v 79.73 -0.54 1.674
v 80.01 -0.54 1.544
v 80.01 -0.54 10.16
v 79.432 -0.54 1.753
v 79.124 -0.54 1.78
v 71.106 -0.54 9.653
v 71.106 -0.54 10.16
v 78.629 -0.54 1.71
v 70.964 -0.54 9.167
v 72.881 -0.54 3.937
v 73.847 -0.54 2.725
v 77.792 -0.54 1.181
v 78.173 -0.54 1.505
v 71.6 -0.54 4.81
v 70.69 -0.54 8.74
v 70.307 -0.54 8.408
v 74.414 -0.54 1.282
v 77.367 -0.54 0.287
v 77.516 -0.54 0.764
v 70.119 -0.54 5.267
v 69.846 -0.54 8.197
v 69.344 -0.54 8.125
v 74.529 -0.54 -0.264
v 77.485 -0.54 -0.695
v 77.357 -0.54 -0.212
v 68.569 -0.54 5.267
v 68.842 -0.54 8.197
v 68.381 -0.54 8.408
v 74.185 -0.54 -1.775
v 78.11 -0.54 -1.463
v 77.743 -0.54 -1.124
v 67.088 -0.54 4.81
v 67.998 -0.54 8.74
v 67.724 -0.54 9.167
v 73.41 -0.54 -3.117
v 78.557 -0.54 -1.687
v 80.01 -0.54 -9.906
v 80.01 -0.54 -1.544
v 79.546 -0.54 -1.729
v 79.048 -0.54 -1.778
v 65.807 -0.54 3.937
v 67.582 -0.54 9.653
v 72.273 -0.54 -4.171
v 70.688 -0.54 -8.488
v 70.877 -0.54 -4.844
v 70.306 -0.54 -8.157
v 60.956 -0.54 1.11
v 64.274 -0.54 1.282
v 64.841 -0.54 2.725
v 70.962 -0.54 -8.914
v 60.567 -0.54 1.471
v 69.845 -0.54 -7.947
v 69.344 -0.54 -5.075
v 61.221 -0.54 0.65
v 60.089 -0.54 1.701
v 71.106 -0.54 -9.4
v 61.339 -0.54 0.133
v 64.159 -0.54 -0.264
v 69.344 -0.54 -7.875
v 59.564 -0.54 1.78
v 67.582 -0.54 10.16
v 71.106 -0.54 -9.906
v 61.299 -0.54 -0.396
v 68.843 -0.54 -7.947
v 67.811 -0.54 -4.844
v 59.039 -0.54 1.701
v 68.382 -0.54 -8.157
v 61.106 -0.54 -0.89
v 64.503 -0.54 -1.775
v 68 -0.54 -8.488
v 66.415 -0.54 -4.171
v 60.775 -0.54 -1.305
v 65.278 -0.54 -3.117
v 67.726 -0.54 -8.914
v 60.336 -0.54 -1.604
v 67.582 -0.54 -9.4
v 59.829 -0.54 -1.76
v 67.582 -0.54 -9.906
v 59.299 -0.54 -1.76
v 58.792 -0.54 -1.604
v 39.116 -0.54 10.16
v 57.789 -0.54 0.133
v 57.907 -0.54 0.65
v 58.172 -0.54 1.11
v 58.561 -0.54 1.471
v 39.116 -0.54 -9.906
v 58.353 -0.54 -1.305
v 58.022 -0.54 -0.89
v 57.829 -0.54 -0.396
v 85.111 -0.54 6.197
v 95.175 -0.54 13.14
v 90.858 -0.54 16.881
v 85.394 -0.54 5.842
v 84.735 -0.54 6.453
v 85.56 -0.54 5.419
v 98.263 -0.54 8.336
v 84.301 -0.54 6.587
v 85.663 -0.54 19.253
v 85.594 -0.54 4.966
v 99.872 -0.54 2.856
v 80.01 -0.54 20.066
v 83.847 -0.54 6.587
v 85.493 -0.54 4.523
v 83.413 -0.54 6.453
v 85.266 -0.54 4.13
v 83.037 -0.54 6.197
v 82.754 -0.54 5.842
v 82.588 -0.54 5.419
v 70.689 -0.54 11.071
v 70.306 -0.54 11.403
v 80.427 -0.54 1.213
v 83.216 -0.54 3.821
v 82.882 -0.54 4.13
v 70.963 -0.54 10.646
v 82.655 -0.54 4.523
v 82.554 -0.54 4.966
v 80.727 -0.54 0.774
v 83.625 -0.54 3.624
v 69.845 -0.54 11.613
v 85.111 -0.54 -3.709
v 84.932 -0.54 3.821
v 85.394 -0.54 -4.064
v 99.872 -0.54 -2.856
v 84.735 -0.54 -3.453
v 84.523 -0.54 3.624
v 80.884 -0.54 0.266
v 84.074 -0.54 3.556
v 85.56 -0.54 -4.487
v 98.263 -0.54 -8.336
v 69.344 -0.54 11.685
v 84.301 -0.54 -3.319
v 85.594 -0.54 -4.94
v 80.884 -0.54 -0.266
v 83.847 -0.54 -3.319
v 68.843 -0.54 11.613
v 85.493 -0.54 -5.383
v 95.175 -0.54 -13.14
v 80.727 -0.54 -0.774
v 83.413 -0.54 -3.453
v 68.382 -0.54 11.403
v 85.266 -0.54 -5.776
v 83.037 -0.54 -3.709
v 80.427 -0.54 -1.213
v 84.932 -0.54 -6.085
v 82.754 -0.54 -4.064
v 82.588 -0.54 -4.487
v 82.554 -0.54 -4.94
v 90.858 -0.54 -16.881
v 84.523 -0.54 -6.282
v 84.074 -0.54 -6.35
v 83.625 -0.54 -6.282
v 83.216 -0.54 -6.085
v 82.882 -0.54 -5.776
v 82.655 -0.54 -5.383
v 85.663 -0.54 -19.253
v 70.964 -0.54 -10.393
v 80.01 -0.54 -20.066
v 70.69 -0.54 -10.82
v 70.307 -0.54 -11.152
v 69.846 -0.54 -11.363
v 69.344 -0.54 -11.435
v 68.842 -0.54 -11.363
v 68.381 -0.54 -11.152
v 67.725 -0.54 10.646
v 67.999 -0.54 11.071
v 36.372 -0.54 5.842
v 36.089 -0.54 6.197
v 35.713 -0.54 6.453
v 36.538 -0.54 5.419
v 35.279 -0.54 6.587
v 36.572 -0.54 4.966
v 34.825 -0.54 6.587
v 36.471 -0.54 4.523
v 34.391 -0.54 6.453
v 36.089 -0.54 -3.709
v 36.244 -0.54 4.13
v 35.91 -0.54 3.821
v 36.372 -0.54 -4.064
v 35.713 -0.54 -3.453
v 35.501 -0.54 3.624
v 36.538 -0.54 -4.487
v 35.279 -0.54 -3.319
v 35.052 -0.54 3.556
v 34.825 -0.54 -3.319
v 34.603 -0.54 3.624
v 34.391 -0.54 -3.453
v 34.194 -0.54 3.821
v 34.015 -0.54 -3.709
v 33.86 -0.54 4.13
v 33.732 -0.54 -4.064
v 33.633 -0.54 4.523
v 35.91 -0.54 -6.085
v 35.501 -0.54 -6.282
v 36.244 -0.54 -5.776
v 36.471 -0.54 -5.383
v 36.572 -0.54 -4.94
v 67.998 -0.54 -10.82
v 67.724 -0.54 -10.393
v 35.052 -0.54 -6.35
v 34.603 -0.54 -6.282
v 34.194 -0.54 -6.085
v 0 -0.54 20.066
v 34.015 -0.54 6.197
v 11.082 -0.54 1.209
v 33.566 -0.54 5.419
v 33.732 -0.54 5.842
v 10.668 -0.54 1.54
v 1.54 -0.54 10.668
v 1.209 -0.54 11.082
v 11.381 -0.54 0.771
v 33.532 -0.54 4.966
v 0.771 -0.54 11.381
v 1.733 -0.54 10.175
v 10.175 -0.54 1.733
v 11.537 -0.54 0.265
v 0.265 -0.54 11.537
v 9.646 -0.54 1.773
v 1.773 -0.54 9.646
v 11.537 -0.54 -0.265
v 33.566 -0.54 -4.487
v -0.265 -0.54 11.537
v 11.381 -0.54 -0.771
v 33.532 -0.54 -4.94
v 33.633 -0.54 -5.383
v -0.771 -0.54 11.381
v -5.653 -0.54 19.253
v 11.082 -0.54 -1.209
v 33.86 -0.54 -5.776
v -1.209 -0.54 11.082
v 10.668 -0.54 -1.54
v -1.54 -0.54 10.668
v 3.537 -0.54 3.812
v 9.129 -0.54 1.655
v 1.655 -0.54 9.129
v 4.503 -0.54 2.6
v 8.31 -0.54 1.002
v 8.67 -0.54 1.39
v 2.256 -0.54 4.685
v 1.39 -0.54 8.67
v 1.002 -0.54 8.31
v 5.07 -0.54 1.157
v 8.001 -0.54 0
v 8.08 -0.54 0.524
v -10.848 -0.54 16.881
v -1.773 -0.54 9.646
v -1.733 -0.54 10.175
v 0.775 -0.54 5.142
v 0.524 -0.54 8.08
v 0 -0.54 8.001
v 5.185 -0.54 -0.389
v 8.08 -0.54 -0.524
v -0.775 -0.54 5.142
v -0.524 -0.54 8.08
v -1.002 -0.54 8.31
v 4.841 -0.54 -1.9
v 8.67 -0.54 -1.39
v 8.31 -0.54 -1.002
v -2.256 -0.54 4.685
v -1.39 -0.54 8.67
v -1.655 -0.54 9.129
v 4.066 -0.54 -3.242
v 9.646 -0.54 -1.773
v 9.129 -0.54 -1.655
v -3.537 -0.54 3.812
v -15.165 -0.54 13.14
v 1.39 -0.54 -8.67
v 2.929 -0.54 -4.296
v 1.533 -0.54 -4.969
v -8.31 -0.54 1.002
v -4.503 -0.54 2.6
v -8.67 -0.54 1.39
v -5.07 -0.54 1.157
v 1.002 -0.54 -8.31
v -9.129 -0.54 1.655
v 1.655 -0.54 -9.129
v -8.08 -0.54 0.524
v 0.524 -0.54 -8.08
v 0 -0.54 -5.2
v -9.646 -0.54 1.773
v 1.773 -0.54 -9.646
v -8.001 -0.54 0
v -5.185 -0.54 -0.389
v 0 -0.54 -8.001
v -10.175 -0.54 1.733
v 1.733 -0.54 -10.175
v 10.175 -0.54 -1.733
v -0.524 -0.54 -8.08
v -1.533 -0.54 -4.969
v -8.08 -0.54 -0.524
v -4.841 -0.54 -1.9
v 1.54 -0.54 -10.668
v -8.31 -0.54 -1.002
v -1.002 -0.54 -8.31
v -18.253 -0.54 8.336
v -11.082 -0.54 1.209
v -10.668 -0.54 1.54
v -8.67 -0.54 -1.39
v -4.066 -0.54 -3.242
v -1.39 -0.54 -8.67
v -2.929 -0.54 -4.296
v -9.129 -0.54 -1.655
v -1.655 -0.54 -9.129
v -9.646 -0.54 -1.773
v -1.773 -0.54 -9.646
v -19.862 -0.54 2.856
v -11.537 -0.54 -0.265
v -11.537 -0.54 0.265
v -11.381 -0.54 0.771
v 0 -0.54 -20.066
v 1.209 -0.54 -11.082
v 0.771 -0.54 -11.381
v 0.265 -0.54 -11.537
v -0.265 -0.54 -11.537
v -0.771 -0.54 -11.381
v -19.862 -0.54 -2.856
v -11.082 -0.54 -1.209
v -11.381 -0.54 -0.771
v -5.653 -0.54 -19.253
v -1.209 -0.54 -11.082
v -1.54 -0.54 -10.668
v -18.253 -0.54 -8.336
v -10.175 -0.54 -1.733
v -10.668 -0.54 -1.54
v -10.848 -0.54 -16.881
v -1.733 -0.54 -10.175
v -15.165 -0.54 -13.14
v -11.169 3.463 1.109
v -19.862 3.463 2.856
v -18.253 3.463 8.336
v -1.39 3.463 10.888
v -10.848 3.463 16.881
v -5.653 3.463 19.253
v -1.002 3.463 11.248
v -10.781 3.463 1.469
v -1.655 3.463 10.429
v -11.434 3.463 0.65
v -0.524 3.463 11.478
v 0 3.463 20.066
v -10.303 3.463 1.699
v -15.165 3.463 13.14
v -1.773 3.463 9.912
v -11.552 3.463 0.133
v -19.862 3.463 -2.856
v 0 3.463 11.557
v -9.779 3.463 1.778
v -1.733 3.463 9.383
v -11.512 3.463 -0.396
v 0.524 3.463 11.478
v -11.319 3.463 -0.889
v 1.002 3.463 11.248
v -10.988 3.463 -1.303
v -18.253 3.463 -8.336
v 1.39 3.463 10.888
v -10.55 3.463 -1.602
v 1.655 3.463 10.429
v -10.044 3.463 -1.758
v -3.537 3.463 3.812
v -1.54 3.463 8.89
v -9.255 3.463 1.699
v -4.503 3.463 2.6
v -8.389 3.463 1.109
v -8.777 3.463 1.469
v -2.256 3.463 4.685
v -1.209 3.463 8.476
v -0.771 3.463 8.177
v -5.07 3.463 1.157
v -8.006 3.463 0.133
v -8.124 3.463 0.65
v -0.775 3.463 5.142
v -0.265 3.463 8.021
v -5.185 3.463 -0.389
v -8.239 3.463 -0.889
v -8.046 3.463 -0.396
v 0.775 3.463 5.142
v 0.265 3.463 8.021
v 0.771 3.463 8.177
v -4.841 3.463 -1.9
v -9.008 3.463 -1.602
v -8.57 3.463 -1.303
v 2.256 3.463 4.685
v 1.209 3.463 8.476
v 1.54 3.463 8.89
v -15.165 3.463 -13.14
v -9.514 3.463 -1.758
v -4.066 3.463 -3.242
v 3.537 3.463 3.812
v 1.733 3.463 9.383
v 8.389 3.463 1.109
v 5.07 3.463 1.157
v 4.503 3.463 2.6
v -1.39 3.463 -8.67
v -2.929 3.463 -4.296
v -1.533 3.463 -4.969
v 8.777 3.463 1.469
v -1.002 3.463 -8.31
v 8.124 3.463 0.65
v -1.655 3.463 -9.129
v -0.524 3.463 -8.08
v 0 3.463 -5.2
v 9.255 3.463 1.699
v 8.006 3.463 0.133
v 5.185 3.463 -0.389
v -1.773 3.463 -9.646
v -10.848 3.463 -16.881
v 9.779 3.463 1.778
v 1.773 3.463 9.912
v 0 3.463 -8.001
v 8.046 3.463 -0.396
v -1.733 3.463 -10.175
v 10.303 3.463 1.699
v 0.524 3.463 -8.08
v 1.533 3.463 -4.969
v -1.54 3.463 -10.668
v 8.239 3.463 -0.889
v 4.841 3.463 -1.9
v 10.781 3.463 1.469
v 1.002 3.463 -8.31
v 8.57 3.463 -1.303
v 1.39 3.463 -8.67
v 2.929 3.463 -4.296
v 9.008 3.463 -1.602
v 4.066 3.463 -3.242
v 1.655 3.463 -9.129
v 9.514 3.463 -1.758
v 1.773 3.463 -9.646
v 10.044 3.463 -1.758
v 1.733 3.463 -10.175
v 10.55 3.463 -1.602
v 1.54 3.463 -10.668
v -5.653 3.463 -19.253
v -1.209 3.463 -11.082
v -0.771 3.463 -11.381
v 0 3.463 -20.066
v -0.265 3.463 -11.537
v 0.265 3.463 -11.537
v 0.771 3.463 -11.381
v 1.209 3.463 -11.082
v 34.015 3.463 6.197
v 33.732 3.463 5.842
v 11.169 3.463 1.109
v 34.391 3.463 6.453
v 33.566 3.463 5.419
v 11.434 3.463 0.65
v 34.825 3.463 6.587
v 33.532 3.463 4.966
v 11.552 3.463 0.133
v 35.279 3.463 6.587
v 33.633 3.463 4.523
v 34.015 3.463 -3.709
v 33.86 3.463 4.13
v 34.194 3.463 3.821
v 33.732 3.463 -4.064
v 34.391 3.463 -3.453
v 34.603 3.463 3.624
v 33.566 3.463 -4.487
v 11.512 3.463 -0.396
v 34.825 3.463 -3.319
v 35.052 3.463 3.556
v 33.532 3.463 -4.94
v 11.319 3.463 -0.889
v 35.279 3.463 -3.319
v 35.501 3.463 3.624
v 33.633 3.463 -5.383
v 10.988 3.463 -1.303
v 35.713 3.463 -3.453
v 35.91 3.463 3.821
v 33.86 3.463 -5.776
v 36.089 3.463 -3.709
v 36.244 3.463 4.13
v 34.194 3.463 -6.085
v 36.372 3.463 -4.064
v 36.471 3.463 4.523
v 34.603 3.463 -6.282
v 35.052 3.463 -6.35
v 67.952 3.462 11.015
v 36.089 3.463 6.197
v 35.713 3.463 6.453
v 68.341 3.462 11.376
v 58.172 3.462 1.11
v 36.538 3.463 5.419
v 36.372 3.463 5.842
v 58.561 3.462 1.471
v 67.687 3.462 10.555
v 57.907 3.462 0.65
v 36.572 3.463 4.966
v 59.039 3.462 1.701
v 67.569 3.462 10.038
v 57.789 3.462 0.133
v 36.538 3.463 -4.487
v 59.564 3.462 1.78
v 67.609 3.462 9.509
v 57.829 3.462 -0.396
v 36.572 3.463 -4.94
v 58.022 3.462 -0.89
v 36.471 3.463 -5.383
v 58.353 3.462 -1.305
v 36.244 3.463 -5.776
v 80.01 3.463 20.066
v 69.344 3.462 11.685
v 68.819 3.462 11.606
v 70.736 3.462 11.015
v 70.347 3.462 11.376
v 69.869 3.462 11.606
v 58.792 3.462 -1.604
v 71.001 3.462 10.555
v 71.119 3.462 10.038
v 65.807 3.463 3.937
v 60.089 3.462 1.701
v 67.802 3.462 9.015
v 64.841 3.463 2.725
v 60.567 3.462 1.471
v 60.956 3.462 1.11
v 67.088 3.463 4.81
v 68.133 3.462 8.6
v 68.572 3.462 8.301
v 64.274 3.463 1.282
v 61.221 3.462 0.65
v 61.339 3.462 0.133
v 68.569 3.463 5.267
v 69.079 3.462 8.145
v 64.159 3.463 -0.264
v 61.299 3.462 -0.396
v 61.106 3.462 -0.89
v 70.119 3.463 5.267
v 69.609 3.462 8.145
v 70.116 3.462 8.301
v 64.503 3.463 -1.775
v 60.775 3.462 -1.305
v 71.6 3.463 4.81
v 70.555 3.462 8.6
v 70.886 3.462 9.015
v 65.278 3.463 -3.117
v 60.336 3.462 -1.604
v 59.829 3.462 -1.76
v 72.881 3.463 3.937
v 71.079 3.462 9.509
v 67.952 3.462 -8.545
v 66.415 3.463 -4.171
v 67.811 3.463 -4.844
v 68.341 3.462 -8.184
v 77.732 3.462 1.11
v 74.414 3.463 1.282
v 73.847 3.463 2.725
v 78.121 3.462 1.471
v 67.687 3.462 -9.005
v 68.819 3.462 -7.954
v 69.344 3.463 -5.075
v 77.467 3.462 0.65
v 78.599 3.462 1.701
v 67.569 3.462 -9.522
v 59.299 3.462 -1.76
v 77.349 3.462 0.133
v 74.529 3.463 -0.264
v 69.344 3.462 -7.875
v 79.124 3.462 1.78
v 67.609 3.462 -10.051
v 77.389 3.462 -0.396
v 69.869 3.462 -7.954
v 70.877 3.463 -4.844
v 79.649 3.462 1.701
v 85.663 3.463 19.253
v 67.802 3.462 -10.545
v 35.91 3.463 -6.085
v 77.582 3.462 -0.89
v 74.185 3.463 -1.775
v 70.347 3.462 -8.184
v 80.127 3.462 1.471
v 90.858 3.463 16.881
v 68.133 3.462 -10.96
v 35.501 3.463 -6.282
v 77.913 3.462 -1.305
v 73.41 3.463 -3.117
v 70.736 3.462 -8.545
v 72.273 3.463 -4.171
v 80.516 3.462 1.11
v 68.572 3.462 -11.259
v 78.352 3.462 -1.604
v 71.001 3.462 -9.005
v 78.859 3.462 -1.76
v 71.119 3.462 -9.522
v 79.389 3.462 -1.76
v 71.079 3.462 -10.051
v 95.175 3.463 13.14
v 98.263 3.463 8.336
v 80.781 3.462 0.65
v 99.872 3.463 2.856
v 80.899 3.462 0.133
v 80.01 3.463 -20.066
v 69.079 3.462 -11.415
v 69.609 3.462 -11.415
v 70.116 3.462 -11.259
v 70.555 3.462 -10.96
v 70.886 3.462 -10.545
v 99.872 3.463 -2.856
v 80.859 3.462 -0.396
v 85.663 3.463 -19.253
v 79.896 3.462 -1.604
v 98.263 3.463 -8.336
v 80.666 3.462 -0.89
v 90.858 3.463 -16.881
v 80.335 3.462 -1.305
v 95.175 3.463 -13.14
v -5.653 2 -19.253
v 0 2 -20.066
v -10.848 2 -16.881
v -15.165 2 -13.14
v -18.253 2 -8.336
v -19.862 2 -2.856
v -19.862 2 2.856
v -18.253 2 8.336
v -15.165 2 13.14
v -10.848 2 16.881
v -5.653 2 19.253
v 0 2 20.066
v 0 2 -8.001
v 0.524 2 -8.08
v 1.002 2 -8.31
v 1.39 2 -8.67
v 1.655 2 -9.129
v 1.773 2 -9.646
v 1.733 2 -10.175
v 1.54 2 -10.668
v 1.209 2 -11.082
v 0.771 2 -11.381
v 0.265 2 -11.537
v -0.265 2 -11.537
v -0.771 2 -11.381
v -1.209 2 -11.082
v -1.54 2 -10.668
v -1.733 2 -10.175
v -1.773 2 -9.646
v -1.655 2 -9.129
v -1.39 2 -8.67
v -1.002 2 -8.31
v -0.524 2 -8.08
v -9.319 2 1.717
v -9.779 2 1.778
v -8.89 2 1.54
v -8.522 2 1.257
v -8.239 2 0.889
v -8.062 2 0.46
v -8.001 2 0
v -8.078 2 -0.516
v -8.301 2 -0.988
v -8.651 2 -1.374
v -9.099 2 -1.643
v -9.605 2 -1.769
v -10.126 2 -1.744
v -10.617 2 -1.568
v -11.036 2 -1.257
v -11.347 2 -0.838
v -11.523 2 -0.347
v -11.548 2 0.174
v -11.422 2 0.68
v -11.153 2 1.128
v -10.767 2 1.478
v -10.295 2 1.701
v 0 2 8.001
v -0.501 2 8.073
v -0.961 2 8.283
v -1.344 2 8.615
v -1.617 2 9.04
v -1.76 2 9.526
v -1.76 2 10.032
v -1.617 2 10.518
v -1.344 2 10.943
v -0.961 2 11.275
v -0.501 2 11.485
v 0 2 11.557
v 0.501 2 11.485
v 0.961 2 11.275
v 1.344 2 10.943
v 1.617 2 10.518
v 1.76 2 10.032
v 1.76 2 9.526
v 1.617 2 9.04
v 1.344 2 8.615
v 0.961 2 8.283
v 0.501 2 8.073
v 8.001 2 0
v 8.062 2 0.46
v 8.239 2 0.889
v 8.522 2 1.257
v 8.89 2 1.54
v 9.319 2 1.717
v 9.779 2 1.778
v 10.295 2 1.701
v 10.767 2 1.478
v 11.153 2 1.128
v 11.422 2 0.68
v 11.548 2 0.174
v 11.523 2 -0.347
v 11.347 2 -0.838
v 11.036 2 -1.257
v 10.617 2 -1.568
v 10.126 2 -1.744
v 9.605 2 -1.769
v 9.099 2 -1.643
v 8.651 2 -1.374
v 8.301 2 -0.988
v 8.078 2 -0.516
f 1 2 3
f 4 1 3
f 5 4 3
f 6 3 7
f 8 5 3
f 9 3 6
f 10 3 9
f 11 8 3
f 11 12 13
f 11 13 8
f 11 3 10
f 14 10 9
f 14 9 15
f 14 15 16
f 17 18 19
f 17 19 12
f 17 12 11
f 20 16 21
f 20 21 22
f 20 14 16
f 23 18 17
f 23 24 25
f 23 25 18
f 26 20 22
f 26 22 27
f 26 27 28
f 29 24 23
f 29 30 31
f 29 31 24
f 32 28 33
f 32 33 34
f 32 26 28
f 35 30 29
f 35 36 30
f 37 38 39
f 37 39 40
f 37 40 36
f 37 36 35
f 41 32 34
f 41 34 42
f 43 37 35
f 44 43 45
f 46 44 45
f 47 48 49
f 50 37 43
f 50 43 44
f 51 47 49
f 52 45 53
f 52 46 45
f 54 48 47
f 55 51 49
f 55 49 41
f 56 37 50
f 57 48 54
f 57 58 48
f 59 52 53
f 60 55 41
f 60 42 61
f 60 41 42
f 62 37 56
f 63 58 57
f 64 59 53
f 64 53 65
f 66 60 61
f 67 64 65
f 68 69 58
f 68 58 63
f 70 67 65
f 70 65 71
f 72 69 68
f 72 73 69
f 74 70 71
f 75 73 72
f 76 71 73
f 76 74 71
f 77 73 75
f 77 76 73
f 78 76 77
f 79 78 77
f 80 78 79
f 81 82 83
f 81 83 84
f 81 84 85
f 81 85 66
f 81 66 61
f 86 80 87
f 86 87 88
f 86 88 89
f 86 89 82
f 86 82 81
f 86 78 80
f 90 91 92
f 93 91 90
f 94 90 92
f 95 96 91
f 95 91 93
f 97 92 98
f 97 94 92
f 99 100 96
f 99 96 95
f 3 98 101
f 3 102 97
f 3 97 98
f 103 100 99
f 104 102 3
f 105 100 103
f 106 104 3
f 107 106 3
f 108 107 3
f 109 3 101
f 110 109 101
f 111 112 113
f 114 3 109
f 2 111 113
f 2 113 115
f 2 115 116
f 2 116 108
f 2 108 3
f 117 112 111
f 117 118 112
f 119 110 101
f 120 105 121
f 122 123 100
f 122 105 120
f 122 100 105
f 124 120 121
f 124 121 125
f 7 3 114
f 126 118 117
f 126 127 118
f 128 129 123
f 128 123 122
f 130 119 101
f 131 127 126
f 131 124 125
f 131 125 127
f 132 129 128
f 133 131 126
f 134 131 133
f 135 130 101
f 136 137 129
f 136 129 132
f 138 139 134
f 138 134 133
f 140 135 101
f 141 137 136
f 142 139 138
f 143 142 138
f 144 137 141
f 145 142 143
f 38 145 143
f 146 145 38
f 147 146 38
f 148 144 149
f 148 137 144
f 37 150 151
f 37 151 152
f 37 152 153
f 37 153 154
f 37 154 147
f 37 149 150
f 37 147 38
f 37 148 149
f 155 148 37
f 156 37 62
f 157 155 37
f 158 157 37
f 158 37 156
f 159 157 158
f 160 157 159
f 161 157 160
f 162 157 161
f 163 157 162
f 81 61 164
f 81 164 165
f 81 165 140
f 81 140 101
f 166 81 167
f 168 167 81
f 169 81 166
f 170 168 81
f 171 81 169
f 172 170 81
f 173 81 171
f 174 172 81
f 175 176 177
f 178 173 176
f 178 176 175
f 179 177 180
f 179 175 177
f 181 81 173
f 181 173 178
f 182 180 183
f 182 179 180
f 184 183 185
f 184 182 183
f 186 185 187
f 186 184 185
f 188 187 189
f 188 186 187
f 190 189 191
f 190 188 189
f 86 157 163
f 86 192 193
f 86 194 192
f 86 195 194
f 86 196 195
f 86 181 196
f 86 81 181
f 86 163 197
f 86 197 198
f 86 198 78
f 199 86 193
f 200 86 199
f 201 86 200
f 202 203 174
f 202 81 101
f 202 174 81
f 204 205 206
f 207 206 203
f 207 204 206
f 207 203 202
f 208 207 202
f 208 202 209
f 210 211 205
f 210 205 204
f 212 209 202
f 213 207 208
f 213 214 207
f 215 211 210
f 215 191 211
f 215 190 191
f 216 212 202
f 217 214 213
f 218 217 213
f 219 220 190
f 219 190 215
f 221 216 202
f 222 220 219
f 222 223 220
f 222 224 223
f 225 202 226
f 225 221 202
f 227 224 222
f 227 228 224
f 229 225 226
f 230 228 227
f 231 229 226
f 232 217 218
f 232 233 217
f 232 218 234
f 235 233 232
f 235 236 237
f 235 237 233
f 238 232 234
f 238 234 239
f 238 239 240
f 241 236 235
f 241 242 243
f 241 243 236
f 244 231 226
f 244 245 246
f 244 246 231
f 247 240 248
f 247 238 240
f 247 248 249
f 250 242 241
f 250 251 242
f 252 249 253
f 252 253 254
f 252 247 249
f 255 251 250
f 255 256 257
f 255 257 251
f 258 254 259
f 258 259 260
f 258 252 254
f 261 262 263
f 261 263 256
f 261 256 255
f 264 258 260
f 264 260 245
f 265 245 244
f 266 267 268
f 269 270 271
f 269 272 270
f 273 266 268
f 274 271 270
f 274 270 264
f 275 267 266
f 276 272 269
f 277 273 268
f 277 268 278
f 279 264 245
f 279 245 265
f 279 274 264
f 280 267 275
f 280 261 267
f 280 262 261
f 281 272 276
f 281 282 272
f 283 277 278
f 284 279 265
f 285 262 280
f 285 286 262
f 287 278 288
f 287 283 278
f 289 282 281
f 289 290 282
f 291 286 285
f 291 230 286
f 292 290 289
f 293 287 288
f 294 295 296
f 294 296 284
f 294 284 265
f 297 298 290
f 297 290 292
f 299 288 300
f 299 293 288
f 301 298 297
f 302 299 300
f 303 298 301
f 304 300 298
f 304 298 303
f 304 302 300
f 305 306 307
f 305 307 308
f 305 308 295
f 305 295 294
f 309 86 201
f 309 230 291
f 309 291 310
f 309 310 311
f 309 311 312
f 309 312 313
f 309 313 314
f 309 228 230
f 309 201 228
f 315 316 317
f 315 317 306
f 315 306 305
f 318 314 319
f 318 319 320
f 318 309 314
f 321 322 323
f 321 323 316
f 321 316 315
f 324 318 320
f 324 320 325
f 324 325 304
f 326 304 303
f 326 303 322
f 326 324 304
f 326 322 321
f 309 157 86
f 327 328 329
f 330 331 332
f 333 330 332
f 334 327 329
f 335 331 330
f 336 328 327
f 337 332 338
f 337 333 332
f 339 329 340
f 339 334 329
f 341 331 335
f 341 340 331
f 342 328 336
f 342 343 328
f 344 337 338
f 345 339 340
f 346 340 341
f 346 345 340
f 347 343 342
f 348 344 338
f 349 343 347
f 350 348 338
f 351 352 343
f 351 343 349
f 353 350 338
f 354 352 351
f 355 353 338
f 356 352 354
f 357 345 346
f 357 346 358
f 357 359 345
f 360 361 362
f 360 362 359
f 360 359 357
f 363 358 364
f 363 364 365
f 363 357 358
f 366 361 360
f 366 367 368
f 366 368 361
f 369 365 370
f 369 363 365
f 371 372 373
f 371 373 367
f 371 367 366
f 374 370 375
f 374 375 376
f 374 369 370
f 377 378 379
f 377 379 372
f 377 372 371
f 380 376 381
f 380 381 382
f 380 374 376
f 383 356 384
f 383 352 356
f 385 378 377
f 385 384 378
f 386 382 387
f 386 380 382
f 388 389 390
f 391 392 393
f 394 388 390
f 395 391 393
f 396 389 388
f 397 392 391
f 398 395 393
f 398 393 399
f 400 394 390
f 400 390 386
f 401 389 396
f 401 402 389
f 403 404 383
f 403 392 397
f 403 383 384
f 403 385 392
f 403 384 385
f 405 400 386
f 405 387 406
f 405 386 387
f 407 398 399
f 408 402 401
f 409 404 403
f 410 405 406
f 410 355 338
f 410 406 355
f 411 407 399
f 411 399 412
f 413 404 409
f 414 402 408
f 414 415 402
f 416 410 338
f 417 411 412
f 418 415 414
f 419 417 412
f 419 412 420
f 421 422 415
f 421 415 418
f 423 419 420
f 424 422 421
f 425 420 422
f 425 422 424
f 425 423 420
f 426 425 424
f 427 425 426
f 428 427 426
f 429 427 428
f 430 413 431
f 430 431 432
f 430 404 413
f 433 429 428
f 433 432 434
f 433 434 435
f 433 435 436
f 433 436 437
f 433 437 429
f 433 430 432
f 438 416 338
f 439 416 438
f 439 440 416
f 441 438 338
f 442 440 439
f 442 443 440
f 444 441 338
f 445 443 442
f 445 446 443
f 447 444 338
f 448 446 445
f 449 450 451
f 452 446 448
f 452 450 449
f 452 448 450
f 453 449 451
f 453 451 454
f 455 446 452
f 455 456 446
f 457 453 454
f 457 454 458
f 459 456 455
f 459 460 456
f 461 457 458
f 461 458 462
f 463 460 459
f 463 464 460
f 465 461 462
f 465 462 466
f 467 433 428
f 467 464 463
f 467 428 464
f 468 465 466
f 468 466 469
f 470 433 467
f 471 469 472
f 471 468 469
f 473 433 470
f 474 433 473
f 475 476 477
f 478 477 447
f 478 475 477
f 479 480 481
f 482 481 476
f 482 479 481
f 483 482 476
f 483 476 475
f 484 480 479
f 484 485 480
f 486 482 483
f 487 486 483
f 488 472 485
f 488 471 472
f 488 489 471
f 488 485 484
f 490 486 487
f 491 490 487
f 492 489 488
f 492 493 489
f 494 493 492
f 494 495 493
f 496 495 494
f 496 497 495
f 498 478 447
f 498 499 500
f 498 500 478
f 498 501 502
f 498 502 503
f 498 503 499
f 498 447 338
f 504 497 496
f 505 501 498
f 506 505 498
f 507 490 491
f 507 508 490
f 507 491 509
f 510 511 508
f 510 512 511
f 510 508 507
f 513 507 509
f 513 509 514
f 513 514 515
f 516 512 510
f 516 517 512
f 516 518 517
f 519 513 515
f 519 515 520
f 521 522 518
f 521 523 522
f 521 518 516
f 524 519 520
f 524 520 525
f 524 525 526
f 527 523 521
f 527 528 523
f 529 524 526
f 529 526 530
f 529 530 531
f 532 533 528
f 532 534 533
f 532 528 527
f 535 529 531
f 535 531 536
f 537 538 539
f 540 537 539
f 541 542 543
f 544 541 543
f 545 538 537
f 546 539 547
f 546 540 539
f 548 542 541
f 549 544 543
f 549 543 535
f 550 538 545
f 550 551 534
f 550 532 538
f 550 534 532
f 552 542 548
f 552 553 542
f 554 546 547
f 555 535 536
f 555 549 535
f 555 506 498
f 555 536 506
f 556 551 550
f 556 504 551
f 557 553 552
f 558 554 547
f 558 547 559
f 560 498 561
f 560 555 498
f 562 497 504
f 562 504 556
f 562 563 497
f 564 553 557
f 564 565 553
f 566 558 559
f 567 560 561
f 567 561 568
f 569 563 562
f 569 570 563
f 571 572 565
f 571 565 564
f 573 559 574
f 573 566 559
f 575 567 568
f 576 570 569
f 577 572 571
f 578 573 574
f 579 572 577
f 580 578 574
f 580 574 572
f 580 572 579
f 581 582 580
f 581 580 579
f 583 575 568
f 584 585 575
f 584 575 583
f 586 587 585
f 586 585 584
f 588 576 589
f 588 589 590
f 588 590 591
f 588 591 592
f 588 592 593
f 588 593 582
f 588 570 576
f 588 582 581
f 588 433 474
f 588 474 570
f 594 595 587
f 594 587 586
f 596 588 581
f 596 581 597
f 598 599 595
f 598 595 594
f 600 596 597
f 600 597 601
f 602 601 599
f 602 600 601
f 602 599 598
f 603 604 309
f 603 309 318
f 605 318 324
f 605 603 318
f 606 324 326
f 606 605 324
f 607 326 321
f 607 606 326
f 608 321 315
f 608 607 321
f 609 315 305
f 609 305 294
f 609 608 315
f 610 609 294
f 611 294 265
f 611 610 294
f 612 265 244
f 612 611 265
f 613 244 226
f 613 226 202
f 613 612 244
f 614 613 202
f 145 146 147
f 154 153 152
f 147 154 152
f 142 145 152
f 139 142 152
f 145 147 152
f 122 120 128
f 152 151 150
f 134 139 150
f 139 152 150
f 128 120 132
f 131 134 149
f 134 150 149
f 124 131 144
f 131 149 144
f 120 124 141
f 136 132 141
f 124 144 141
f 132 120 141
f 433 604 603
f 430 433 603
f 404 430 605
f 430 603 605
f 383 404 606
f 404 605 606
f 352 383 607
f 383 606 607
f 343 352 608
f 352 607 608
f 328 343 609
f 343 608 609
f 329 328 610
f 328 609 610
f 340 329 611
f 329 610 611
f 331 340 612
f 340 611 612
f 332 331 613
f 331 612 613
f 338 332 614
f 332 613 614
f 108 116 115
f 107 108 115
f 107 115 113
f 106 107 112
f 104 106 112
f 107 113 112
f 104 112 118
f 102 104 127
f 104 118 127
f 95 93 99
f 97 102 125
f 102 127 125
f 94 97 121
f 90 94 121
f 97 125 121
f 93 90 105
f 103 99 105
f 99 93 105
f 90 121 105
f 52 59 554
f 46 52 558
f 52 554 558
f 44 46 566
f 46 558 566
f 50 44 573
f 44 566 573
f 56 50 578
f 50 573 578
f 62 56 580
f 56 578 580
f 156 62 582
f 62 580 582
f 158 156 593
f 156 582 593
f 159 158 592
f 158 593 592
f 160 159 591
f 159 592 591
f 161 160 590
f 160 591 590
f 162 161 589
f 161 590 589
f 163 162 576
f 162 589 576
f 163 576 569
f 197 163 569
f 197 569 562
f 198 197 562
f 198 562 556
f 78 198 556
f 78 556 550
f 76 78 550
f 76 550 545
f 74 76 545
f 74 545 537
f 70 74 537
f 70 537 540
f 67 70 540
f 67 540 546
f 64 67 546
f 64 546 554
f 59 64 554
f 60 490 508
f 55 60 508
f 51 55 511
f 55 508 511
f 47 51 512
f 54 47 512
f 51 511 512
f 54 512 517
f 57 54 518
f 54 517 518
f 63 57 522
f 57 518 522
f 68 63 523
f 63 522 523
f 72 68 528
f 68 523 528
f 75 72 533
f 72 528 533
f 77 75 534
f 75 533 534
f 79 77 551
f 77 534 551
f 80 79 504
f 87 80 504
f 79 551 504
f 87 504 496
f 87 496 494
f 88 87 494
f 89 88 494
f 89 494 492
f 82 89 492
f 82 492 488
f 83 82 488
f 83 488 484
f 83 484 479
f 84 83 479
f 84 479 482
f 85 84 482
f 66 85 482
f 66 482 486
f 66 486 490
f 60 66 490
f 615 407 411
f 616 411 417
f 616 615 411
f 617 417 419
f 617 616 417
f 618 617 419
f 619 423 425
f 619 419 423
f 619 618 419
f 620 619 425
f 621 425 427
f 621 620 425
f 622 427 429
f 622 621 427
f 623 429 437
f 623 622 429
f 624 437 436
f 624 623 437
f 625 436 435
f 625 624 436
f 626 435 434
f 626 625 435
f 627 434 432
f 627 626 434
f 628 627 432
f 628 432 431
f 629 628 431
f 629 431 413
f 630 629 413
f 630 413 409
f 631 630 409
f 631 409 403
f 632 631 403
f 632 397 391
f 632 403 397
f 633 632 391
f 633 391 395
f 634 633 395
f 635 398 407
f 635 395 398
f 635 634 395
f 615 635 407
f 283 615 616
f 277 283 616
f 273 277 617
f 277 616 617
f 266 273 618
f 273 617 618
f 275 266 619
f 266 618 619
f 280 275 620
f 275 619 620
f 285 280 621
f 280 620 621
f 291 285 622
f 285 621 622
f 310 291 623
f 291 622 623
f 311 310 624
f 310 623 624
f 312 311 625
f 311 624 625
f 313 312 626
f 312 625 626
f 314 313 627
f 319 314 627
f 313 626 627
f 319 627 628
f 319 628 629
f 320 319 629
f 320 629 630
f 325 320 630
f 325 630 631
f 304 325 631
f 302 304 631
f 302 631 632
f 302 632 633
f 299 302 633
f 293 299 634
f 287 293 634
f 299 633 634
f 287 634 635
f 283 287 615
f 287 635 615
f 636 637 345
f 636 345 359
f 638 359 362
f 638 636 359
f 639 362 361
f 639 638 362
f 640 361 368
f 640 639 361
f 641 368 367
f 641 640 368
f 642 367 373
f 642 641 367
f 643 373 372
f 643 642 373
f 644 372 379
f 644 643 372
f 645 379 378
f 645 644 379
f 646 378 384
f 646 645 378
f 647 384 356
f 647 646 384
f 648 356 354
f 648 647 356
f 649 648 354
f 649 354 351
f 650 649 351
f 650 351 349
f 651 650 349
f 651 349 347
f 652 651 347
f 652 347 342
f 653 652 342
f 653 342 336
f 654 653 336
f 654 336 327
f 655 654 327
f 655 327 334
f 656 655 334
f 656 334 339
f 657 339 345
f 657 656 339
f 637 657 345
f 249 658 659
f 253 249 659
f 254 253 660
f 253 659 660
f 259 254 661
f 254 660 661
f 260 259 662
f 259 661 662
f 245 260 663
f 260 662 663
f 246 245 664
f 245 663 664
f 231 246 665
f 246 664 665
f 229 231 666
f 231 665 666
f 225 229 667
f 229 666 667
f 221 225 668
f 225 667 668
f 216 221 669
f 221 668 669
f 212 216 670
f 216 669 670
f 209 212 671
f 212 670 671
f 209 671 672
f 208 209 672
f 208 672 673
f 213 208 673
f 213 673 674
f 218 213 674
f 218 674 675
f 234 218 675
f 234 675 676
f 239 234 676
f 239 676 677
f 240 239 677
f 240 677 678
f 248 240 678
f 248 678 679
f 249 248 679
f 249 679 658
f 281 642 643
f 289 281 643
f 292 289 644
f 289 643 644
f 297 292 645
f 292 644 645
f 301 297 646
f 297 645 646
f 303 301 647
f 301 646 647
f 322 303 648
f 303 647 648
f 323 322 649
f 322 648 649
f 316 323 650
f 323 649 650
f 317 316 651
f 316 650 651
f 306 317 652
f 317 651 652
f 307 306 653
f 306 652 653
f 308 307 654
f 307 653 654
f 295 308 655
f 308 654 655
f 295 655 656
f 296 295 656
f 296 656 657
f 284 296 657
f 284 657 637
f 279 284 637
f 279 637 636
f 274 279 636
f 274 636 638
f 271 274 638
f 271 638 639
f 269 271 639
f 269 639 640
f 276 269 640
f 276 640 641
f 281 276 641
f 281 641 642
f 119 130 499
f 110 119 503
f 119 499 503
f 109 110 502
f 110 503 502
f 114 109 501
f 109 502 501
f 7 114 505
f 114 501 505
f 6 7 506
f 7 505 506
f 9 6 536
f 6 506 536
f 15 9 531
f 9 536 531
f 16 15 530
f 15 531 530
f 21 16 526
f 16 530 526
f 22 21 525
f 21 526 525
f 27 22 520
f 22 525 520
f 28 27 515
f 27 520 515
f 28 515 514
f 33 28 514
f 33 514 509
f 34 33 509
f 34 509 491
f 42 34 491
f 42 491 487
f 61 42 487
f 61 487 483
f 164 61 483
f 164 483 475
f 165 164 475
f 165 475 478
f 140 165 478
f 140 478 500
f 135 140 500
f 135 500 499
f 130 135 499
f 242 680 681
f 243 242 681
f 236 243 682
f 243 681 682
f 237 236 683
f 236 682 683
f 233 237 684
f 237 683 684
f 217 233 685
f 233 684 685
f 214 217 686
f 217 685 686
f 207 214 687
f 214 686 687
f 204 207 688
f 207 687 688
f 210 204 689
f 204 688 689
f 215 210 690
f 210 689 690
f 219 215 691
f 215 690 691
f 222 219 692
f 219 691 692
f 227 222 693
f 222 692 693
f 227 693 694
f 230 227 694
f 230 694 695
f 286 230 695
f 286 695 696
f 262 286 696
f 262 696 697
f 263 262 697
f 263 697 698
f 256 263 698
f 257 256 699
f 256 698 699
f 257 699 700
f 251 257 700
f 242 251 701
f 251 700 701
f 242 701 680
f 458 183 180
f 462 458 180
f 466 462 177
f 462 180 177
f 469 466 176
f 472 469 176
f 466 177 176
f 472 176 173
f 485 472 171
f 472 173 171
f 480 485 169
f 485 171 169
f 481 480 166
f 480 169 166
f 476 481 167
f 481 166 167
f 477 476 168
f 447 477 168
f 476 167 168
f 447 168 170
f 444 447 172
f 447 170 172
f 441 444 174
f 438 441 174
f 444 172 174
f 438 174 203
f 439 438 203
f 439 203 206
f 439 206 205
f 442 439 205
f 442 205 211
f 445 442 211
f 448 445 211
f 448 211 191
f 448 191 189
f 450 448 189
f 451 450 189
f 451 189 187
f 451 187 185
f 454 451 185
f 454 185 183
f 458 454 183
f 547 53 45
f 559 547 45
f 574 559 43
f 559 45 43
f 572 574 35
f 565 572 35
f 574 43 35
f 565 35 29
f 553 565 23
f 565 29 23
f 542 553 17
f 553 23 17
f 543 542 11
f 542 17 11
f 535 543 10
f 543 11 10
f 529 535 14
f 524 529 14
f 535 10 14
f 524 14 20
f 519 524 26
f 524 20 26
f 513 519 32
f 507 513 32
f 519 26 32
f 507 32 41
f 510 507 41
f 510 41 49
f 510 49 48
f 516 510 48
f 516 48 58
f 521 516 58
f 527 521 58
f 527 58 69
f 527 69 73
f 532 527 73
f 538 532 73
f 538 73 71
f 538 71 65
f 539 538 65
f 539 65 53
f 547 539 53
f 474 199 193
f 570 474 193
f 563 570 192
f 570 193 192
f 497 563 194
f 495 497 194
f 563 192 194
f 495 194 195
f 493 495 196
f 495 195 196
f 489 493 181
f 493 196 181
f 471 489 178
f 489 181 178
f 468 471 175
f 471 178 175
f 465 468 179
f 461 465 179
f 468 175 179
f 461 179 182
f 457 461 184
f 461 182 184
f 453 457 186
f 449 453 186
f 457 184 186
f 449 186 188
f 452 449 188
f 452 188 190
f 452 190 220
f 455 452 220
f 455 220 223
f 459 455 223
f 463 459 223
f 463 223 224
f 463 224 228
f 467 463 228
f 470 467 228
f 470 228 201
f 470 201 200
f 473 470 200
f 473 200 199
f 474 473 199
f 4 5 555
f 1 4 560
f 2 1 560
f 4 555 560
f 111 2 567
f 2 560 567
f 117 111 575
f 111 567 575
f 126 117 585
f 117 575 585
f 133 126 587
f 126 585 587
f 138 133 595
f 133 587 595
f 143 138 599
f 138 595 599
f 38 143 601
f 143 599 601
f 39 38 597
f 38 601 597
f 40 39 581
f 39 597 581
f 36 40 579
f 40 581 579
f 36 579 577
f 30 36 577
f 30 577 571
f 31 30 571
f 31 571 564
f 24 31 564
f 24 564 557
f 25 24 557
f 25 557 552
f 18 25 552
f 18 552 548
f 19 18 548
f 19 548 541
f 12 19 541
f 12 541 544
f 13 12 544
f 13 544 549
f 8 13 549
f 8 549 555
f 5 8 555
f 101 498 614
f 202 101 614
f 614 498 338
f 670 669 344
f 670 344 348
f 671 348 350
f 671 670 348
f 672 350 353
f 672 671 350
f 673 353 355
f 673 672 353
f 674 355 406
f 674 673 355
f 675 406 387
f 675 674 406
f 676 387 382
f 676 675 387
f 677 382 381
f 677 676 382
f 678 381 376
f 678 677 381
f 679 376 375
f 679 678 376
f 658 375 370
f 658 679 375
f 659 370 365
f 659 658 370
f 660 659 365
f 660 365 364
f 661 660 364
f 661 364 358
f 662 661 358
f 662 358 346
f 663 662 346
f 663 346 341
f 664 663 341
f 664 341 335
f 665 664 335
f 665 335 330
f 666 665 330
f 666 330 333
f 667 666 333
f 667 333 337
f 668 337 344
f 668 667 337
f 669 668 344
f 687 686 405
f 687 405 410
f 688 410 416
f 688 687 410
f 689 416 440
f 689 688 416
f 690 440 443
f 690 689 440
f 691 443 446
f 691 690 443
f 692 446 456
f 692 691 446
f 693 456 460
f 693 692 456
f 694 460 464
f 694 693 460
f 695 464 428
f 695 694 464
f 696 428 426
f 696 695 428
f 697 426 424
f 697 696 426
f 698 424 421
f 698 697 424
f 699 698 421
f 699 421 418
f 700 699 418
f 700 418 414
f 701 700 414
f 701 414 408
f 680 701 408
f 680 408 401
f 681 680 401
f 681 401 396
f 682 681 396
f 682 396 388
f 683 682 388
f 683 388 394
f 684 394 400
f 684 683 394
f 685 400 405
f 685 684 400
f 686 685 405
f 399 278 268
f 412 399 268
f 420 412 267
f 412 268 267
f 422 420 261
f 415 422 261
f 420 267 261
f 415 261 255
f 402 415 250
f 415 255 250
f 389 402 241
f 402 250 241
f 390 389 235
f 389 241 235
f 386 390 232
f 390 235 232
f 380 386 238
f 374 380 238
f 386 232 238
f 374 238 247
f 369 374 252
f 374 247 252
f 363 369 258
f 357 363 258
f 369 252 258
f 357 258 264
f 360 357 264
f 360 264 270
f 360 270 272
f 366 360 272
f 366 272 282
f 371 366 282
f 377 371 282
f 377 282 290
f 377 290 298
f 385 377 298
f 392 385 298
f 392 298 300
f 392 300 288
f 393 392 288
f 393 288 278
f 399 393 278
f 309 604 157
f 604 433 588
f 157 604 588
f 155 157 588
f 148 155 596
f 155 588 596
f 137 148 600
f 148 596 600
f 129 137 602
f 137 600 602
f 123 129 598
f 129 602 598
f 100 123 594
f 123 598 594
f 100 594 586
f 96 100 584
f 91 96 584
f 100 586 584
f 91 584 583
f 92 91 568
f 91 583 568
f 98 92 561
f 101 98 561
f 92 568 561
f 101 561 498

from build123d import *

# Parameters (mm, degrees)
SKETCH1_R               = 0.5
SKETCH1_R_2             = 1.375
BOSS_EXTRUDE1_DEPTH     = 2
SKETCH4_R               = 4.6270037
SKETCH4_R_2             = 2.6270037
BOSS_EXTRUDE3_DEPTH     = 2.5
CUT_EXTRUDE3_DEPTH      = 2.5
SKETCH6_R               = 20.066
SKETCH6_R_2             = 3.75
BOSS_EXTRUDE6_DEPTH     = 2.54
SKETCH7_R               = 1.778
CUT_EXTRUDE4_DEPTH      = 2.54
CIRPATTERN1_COUNT       = 4
BOSS_EXTRU_1_DEPTH      = 2.2225
BOSS_EXTRU_1_DEPTH_BACK = 2.54
ESQUISSE3_R             = 20.066
ESQUISSE3_R_2           = 1.778
ESQUISSE3_R_3           = 1.375
BOSS_EXTRU_2_DEPTH      = 2.2225
ENL_V_MAT_EXTRU_1_REACH = 104.179
ESQUISSE4_W             = 40.894
ESQUISSE4_H             = 20.066
ESQUISSE5_R             = 1.524
ENL_V_MAT_EXTRU_2_DEPTH = 103.178919246
ESQUISSE6_W             = 129.807809177
ESQUISSE6_H             = 84.506546368
ENL_V_MAT_EXTRU_3_DEPTH = 0.76
ESQUISSE7_R             = 5.2
ENL_V_MAT_EXTRU_4_DEPTH = 103.241877615
ESQUISSE8_W             = 40.894
ESQUISSE8_H             = 20.066
BOSS_EXTRU_3_DEPTH      = 4.0025
ESQUISSE9_R             = 5.2
ENL_V_MAT_EXTRU_5_DEPTH = 10
ESQUISSE11_R            = 1.78
ENL_V_MAT_EXTRU_6_DEPTH = 10
ESQUISSE10_R            = 1.524
BOSS_EXTRU_4_DEPTH      = 4.0025


with BuildPart() as part:
    # Sketch1 → Boss-Extrude1 (new body)
    with BuildSketch(Plane(origin=(0, 0, 0), x_dir=(1, 0, 0), z_dir=(0, 1, 0))):
        with BuildLine():
            Line((-4, 4), (-2.467435953, 13.402193757))
            ThreePointArc((-2.467435953, 13.402193757), (0, 15.5), (2.467435953, 13.402193757))
            Line((2.467435953, 13.402193757), (4, 4))
            Line((4, 4), (12.448472752, 2.459445505))
            ThreePointArc((12.448472752, 2.459445505), (14.5, 0), (12.448472752, -2.459445505))
            Line((12.448472752, -2.459445505), (4, -4))
            Line((4, -4), (2.467435953, -13.402193757))
            ThreePointArc((2.467435953, -13.402193757), (0, -15.5), (-2.467435953, -13.402193757))
            Line((-2.467435953, -13.402193757), (-4, -4))
            Line((-4, -4), (-12.448472752, -2.459445505))
            ThreePointArc((-12.448472752, -2.459445505), (-14.5, 0), (-12.448472752, 2.459445505))
            Line((-12.448472752, 2.459445505), (-4, 4))
        make_face()
        with Locations(Location((0, 12, 0), (0, 0, 270))):
            Circle(SKETCH1_R, mode=Mode.SUBTRACT)
        with Locations(Location((0, 9.5, 0), (0, 0, 270))):
            Circle(SKETCH1_R, mode=Mode.SUBTRACT)
        with Locations(Location((0, 7.5, 0), (0, 0, 270))):
            Circle(SKETCH1_R, mode=Mode.SUBTRACT)
        with Locations(Location((12, 0, 0), (0, 0, 270))):
            Circle(SKETCH1_R, mode=Mode.SUBTRACT)
        with Locations(Location((9.5, 0, 0), (0, 0, 270))):
            Circle(SKETCH1_R, mode=Mode.SUBTRACT)
        with Locations(Location((7.5, 0, 0), (0, 0, 270))):
            Circle(SKETCH1_R, mode=Mode.SUBTRACT)
        with Locations(Location((0, -12, 0), (0, 0, 270))):
            Circle(SKETCH1_R, mode=Mode.SUBTRACT)
        with Locations(Location((0, -9.5, 0), (0, 0, 270))):
            Circle(SKETCH1_R, mode=Mode.SUBTRACT)
        with Locations(Location((0, -7.5, 0), (0, 0, 270))):
            Circle(SKETCH1_R, mode=Mode.SUBTRACT)
        with Locations(Location((-12, 0, 0), (0, 0, 270))):
            Circle(SKETCH1_R, mode=Mode.SUBTRACT)
        with Locations(Location((-9.5, 0, 0), (0, 0, 270))):
            Circle(SKETCH1_R, mode=Mode.SUBTRACT)
        with Locations(Location((-7.5, 0, 0), (0, 0, 270))):
            Circle(SKETCH1_R, mode=Mode.SUBTRACT)
        with Locations(Location((0, 0, 0), (0, 0, 270))):
            Circle(SKETCH1_R_2, mode=Mode.SUBTRACT)
    extrude(amount=BOSS_EXTRUDE1_DEPTH)

    # Sketch4 → Boss-Extrude3 (add)
    with BuildSketch(Plane.XZ):
        with Locations(Location((0, 0, 0), (0, 0, 90))):
            Circle(SKETCH4_R)
        with Locations(Location((0, 0, 0), (0, 0, 270))):
            Circle(SKETCH4_R_2, mode=Mode.SUBTRACT)
    extrude(amount=BOSS_EXTRUDE3_DEPTH)

    # Sketch5 → Cut-Extrude3 (cut)
    with BuildSketch(Plane.XZ.offset(2.5)):
        with BuildLine():
            Line((0.282820055, 2.611735296), (0, 3.101594))
            Line((0, 3.101594), (-0.282820055, 2.611735296))
            ThreePointArc((-0.282820055, 2.611735296), (-0.410953918, 2.594660925), (-0.538092735, 2.571304075))
            Line((-0.538092735, 2.571304075), (-0.958445256, 2.949791185))
            Line((-0.958445256, 2.949791185), (-1.076048447, 2.396511669))
            ThreePointArc((-1.076048447, 2.396511669), (-1.192634723, 2.340677436), (-1.306333259, 2.279175696))
            Line((-1.306333259, 2.279175696), (-1.823071212, 2.509242256))
            Line((-1.823071212, 2.509242256), (-1.76394572, 1.946700782))
            ThreePointArc((-1.76394572, 1.946700782), (-1.85757213, 1.85757213), (-1.946700782, 1.76394572))
            Line((-1.946700782, 1.76394572), (-2.509242256, 1.823071212))
            Line((-2.509242256, 1.823071212), (-2.279175696, 1.306333259))
            ThreePointArc((-2.279175696, 1.306333259), (-2.340677436, 1.192634723), (-2.396511669, 1.076048447))
            Line((-2.396511669, 1.076048447), (-2.949791185, 0.958445256))
            Line((-2.949791185, 0.958445256), (-2.571304075, 0.538092735))
            ThreePointArc((-2.571304075, 0.538092735), (-2.594660925, 0.410953918), (-2.611735296, 0.282820055))
            Line((-2.611735296, 0.282820055), (-3.101594, 0))
            Line((-3.101594, 0), (-2.611735296, -0.282820055))
            ThreePointArc((-2.611735296, -0.282820055), (-2.594660925, -0.410953918), (-2.571304075, -0.538092735))
            Line((-2.571304075, -0.538092735), (-2.949791185, -0.958445256))
            Line((-2.949791185, -0.958445256), (-2.396511669, -1.076048447))
            ThreePointArc((-2.396511669, -1.076048447), (-2.340677436, -1.192634723), (-2.279175696, -1.306333259))
            Line((-2.279175696, -1.306333259), (-2.509242256, -1.823071212))
            Line((-2.509242256, -1.823071212), (-1.946700782, -1.76394572))
            ThreePointArc((-1.946700782, -1.76394572), (-1.85757213, -1.85757213), (-1.76394572, -1.946700782))
            Line((-1.76394572, -1.946700782), (-1.823071212, -2.509242256))
            Line((-1.823071212, -2.509242256), (-1.306333259, -2.279175696))
            ThreePointArc((-1.306333259, -2.279175696), (-1.192634723, -2.340677436), (-1.076048447, -2.396511669))
            Line((-1.076048447, -2.396511669), (-0.958445256, -2.949791185))
            Line((-0.958445256, -2.949791185), (-0.538092735, -2.571304075))
            ThreePointArc((-0.538092735, -2.571304075), (-0.410953918, -2.594660925), (-0.282820055, -2.611735296))
            Line((-0.282820055, -2.611735296), (0, -3.101594))
            Line((0, -3.101594), (0.282820055, -2.611735296))
            ThreePointArc((0.282820055, -2.611735296), (0.410953918, -2.594660925), (0.538092735, -2.571304075))
            Line((0.538092735, -2.571304075), (0.958445256, -2.949791185))
            Line((0.958445256, -2.949791185), (1.076048447, -2.396511669))
            ThreePointArc((1.076048447, -2.396511669), (1.192634723, -2.340677436), (1.306333259, -2.279175696))
            Line((1.306333259, -2.279175696), (1.823071212, -2.509242256))
            Line((1.823071212, -2.509242256), (1.76394572, -1.946700782))
            ThreePointArc((1.76394572, -1.946700782), (1.85757213, -1.85757213), (1.946700782, -1.76394572))
            Line((1.946700782, -1.76394572), (2.509242256, -1.823071212))
            Line((2.509242256, -1.823071212), (2.279175696, -1.306333259))
            ThreePointArc((2.279175696, -1.306333259), (2.340677436, -1.192634723), (2.396511669, -1.076048447))
            Line((2.396511669, -1.076048447), (2.949791185, -0.958445256))
            Line((2.949791185, -0.958445256), (2.571304075, -0.538092735))
            ThreePointArc((2.571304075, -0.538092735), (2.594660925, -0.410953918), (2.611735296, -0.282820055))
            Line((2.611735296, -0.282820055), (3.101594, 0))
            Line((3.101594, 0), (2.611735296, 0.282820055))
            ThreePointArc((2.611735296, 0.282820055), (2.594660925, 0.410953918), (2.571304075, 0.538092735))
            Line((2.571304075, 0.538092735), (2.949791185, 0.958445256))
            Line((2.949791185, 0.958445256), (2.396511669, 1.076048447))
            ThreePointArc((2.396511669, 1.076048447), (2.340677436, 1.192634723), (2.279175696, 1.306333259))
            Line((2.279175696, 1.306333259), (2.509242256, 1.823071212))
            Line((2.509242256, 1.823071212), (1.946700782, 1.76394572))
            ThreePointArc((1.946700782, 1.76394572), (1.85757213, 1.85757213), (1.76394572, 1.946700782))
            Line((1.76394572, 1.946700782), (1.823071212, 2.509242256))
            Line((1.823071212, 2.509242256), (1.306333259, 2.279175696))
            ThreePointArc((1.306333259, 2.279175696), (1.192634723, 2.340677436), (1.076048447, 2.396511669))
            Line((1.076048447, 2.396511669), (0.958445256, 2.949791185))
            Line((0.958445256, 2.949791185), (0.538092735, 2.571304075))
            ThreePointArc((0.538092735, 2.571304075), (0.410953918, 2.594660925), (0.282820055, 2.611735296))
        make_face()
    extrude(amount=-CUT_EXTRUDE3_DEPTH, mode=Mode.SUBTRACT)

    # Sketch6 → Boss-Extrude6 (add)
    with BuildSketch(Plane(origin=(0, 2, 0), x_dir=(1, 0, 0), z_dir=(0, 1, 0))):
        with Locations(Location((0, 0, 0), (0, 0, 270))):
            Circle(SKETCH6_R)
        Circle(SKETCH6_R_2, mode=Mode.SUBTRACT)
    extrude(amount=-BOSS_EXTRUDE6_DEPTH)

    # Sketch7 → Cut-Extrude4 (cut)
    with BuildSketch(Plane(origin=(0, 2, 0), x_dir=(1, 0, 0), z_dir=(0, 1, 0))):
        with Locations(Location((0, 9.779, 0), (0, 0, 270))):
            Circle(SKETCH7_R)
    cut_extrude4 = extrude(amount=-CUT_EXTRUDE4_DEPTH, mode=Mode.SUBTRACT)

    # CirPattern1: Cut-Extrude4 ×4 about axis
    cirpattern1_axis = Axis((0, 0, 0), (0, 1, 0))
    for i in range(1, CIRPATTERN1_COUNT):
        add(cut_extrude4.rotate(cirpattern1_axis, i * 360 / CIRPATTERN1_COUNT), mode=Mode.SUBTRACT)

    # Esquisse1 → Boss.-Extru.1 (add, two sides)
    with BuildSketch(Plane(origin=(0, 2, 0), x_dir=(1, 0, 0), z_dir=(0, 1, 0))) as boss_extru_1_sk:
        with BuildLine():
            Line((0, 20.066), (80.01, 20.066))
            ThreePointArc((80.01, 20.066), (100.076, 0), (80.01, -20.066))
            Line((80.01, -20.066), (0, -20.066))
            ThreePointArc((0, -20.066), (20.066, 0), (0, 20.066))
        make_face()
    extrude(amount=BOSS_EXTRU_1_DEPTH)
    extrude(boss_extru_1_sk.sketch, amount=-BOSS_EXTRU_1_DEPTH_BACK)

    # Esquisse3 → Boss.-Extru.2 (add)
    with BuildSketch(Plane(origin=(0, 2, 0), x_dir=(1, 0, 0), z_dir=(0, 1, 0))):
        Circle(ESQUISSE3_R)
        with Locations(Location((9.779, 0, 0), (0, 0, 270))):
            Circle(ESQUISSE3_R_2, mode=Mode.SUBTRACT)
        with Locations(Location((0, 9.779, 0), (0, 0, 270))):
            Circle(ESQUISSE3_R_2, mode=Mode.SUBTRACT)
        with Locations(Location((-9.779, 0, 0), (0, 0, 270))):
            Circle(ESQUISSE3_R_2, mode=Mode.SUBTRACT)
        with Locations(Location((0, -9.779, 0), (0, 0, 270))):
            Circle(ESQUISSE3_R_2, mode=Mode.SUBTRACT)
        with Locations(Location((0, 0, 0), (0, 0, 270))):
            Circle(ESQUISSE3_R_3, mode=Mode.SUBTRACT)
    extrude(amount=BOSS_EXTRU_2_DEPTH)

    # Esquisse4 → Enlèv. mat.-Extru.1 (cut, up to next)
    with BuildSketch(Plane.XZ.offset(0.54), mode=Mode.PRIVATE) as enl_v_mat_extru_1_sk1:
        with Locations((59.563, 0.127)):
            Rectangle(ESQUISSE4_W, ESQUISSE4_H)
    enl_v_mat_extru_1_tool1 = extrude(enl_v_mat_extru_1_sk1.sketch, amount=-ENL_V_MAT_EXTRU_1_REACH, mode=Mode.PRIVATE) & part.part
    add(enl_v_mat_extru_1_tool1.solids().sort_by_distance((59.563, -0.54, 0.127))[0], mode=Mode.SUBTRACT)

    # Esquisse5 → Enlèv. mat.-Extru.2 (cut, through all)
    with BuildSketch(Plane(origin=(0, -0.54, 0), x_dir=(-1, 0, 0), z_dir=(0, -1, 0))):
        with Locations(Location((-35.052, -5.08, 0), (0, 0, 90))):
            Circle(ESQUISSE5_R)
        with Locations(Location((-35.052, 4.826, 0), (0, 0, 90))):
            Circle(ESQUISSE5_R)
        with Locations(Location((-84.074, -5.08, 0), (0, 0, 90))):
            Circle(ESQUISSE5_R)
        with Locations(Location((-84.074, 4.826, 0), (0, 0, 90))):
            Circle(ESQUISSE5_R)
    extrude(amount=-ENL_V_MAT_EXTRU_2_DEPTH, mode=Mode.SUBTRACT)

    # Esquisse6 → Enlèv. mat.-Extru.3 (cut)
    with BuildSketch(Plane(origin=(0, 4.2225, 0), x_dir=(1, 0, 0), z_dir=(0, 1, 0))):
        with Locations((40.86254749, 2.128524174)):
            Rectangle(ESQUISSE6_W, ESQUISSE6_H)
    extrude(amount=-ENL_V_MAT_EXTRU_3_DEPTH, mode=Mode.SUBTRACT)

    # Esquisse7 → Enlèv. mat.-Extru.4 (cut, through all)
    with BuildSketch(Plane(origin=(0, -2.5, 0), x_dir=(-1, 0, 0), z_dir=(0, -1, 0))):
        with Locations(Location((0, 0, 0), (0, 0, 90))):
            Circle(ESQUISSE7_R)
    extrude(amount=-ENL_V_MAT_EXTRU_4_DEPTH, mode=Mode.SUBTRACT)

    # Esquisse8 → Boss.-Extru.3 (add, through all)
    with BuildSketch(Plane(origin=(0, -0.54, 0), x_dir=(-1, 0, 0), z_dir=(0, -1, 0))):
        with Locations((-59.563, -0.127)):
            Rectangle(ESQUISSE8_W, ESQUISSE8_H)
    extrude(amount=-BOSS_EXTRU_3_DEPTH)

    # Esquisse9 → Enlèv. mat.-Extru.5 (cut)
    with BuildSketch(Plane(origin=(0, -0.54, 0), x_dir=(-1, 0, 0), z_dir=(0, -1, 0))):
        with Locations(Location((-69.344, -0.125, 0), (0, 0, 90))):
            Circle(ESQUISSE9_R)
    extrude(amount=-ENL_V_MAT_EXTRU_5_DEPTH, mode=Mode.SUBTRACT)

    # Esquisse11 → Enlèv. mat.-Extru.6 (cut)
    with BuildSketch(Plane(origin=(0, 3.4625, 0), x_dir=(1, 0, 0), z_dir=(0, 1, 0))):
        with Locations(Location((69.344, 9.655, 0), (0, 0, 270))):
            Circle(ESQUISSE11_R)
        with Locations(Location((69.344, -9.905, 0), (0, 0, 270))):
            Circle(ESQUISSE11_R)
        with Locations(Location((59.564, 0, 0), (0, 0, 270))):
            Circle(ESQUISSE11_R)
        with Locations(Location((79.124, 0, 0), (0, 0, 270))):
            Circle(ESQUISSE11_R)
    extrude(amount=-ENL_V_MAT_EXTRU_6_DEPTH, mode=Mode.SUBTRACT)

    # Esquisse10 → Boss.-Extru.4 (add, through all)
    with BuildSketch(Plane(origin=(0, 3.4625, 0), x_dir=(1, 0, 0), z_dir=(0, 1, 0))):
        with Locations((84.074, 4.826)):
            Circle(ESQUISSE10_R)
        with Locations((84.074, -5.08)):
            Circle(ESQUISSE10_R)
    extrude(amount=-BOSS_EXTRU_4_DEPTH)


solid = part.part
